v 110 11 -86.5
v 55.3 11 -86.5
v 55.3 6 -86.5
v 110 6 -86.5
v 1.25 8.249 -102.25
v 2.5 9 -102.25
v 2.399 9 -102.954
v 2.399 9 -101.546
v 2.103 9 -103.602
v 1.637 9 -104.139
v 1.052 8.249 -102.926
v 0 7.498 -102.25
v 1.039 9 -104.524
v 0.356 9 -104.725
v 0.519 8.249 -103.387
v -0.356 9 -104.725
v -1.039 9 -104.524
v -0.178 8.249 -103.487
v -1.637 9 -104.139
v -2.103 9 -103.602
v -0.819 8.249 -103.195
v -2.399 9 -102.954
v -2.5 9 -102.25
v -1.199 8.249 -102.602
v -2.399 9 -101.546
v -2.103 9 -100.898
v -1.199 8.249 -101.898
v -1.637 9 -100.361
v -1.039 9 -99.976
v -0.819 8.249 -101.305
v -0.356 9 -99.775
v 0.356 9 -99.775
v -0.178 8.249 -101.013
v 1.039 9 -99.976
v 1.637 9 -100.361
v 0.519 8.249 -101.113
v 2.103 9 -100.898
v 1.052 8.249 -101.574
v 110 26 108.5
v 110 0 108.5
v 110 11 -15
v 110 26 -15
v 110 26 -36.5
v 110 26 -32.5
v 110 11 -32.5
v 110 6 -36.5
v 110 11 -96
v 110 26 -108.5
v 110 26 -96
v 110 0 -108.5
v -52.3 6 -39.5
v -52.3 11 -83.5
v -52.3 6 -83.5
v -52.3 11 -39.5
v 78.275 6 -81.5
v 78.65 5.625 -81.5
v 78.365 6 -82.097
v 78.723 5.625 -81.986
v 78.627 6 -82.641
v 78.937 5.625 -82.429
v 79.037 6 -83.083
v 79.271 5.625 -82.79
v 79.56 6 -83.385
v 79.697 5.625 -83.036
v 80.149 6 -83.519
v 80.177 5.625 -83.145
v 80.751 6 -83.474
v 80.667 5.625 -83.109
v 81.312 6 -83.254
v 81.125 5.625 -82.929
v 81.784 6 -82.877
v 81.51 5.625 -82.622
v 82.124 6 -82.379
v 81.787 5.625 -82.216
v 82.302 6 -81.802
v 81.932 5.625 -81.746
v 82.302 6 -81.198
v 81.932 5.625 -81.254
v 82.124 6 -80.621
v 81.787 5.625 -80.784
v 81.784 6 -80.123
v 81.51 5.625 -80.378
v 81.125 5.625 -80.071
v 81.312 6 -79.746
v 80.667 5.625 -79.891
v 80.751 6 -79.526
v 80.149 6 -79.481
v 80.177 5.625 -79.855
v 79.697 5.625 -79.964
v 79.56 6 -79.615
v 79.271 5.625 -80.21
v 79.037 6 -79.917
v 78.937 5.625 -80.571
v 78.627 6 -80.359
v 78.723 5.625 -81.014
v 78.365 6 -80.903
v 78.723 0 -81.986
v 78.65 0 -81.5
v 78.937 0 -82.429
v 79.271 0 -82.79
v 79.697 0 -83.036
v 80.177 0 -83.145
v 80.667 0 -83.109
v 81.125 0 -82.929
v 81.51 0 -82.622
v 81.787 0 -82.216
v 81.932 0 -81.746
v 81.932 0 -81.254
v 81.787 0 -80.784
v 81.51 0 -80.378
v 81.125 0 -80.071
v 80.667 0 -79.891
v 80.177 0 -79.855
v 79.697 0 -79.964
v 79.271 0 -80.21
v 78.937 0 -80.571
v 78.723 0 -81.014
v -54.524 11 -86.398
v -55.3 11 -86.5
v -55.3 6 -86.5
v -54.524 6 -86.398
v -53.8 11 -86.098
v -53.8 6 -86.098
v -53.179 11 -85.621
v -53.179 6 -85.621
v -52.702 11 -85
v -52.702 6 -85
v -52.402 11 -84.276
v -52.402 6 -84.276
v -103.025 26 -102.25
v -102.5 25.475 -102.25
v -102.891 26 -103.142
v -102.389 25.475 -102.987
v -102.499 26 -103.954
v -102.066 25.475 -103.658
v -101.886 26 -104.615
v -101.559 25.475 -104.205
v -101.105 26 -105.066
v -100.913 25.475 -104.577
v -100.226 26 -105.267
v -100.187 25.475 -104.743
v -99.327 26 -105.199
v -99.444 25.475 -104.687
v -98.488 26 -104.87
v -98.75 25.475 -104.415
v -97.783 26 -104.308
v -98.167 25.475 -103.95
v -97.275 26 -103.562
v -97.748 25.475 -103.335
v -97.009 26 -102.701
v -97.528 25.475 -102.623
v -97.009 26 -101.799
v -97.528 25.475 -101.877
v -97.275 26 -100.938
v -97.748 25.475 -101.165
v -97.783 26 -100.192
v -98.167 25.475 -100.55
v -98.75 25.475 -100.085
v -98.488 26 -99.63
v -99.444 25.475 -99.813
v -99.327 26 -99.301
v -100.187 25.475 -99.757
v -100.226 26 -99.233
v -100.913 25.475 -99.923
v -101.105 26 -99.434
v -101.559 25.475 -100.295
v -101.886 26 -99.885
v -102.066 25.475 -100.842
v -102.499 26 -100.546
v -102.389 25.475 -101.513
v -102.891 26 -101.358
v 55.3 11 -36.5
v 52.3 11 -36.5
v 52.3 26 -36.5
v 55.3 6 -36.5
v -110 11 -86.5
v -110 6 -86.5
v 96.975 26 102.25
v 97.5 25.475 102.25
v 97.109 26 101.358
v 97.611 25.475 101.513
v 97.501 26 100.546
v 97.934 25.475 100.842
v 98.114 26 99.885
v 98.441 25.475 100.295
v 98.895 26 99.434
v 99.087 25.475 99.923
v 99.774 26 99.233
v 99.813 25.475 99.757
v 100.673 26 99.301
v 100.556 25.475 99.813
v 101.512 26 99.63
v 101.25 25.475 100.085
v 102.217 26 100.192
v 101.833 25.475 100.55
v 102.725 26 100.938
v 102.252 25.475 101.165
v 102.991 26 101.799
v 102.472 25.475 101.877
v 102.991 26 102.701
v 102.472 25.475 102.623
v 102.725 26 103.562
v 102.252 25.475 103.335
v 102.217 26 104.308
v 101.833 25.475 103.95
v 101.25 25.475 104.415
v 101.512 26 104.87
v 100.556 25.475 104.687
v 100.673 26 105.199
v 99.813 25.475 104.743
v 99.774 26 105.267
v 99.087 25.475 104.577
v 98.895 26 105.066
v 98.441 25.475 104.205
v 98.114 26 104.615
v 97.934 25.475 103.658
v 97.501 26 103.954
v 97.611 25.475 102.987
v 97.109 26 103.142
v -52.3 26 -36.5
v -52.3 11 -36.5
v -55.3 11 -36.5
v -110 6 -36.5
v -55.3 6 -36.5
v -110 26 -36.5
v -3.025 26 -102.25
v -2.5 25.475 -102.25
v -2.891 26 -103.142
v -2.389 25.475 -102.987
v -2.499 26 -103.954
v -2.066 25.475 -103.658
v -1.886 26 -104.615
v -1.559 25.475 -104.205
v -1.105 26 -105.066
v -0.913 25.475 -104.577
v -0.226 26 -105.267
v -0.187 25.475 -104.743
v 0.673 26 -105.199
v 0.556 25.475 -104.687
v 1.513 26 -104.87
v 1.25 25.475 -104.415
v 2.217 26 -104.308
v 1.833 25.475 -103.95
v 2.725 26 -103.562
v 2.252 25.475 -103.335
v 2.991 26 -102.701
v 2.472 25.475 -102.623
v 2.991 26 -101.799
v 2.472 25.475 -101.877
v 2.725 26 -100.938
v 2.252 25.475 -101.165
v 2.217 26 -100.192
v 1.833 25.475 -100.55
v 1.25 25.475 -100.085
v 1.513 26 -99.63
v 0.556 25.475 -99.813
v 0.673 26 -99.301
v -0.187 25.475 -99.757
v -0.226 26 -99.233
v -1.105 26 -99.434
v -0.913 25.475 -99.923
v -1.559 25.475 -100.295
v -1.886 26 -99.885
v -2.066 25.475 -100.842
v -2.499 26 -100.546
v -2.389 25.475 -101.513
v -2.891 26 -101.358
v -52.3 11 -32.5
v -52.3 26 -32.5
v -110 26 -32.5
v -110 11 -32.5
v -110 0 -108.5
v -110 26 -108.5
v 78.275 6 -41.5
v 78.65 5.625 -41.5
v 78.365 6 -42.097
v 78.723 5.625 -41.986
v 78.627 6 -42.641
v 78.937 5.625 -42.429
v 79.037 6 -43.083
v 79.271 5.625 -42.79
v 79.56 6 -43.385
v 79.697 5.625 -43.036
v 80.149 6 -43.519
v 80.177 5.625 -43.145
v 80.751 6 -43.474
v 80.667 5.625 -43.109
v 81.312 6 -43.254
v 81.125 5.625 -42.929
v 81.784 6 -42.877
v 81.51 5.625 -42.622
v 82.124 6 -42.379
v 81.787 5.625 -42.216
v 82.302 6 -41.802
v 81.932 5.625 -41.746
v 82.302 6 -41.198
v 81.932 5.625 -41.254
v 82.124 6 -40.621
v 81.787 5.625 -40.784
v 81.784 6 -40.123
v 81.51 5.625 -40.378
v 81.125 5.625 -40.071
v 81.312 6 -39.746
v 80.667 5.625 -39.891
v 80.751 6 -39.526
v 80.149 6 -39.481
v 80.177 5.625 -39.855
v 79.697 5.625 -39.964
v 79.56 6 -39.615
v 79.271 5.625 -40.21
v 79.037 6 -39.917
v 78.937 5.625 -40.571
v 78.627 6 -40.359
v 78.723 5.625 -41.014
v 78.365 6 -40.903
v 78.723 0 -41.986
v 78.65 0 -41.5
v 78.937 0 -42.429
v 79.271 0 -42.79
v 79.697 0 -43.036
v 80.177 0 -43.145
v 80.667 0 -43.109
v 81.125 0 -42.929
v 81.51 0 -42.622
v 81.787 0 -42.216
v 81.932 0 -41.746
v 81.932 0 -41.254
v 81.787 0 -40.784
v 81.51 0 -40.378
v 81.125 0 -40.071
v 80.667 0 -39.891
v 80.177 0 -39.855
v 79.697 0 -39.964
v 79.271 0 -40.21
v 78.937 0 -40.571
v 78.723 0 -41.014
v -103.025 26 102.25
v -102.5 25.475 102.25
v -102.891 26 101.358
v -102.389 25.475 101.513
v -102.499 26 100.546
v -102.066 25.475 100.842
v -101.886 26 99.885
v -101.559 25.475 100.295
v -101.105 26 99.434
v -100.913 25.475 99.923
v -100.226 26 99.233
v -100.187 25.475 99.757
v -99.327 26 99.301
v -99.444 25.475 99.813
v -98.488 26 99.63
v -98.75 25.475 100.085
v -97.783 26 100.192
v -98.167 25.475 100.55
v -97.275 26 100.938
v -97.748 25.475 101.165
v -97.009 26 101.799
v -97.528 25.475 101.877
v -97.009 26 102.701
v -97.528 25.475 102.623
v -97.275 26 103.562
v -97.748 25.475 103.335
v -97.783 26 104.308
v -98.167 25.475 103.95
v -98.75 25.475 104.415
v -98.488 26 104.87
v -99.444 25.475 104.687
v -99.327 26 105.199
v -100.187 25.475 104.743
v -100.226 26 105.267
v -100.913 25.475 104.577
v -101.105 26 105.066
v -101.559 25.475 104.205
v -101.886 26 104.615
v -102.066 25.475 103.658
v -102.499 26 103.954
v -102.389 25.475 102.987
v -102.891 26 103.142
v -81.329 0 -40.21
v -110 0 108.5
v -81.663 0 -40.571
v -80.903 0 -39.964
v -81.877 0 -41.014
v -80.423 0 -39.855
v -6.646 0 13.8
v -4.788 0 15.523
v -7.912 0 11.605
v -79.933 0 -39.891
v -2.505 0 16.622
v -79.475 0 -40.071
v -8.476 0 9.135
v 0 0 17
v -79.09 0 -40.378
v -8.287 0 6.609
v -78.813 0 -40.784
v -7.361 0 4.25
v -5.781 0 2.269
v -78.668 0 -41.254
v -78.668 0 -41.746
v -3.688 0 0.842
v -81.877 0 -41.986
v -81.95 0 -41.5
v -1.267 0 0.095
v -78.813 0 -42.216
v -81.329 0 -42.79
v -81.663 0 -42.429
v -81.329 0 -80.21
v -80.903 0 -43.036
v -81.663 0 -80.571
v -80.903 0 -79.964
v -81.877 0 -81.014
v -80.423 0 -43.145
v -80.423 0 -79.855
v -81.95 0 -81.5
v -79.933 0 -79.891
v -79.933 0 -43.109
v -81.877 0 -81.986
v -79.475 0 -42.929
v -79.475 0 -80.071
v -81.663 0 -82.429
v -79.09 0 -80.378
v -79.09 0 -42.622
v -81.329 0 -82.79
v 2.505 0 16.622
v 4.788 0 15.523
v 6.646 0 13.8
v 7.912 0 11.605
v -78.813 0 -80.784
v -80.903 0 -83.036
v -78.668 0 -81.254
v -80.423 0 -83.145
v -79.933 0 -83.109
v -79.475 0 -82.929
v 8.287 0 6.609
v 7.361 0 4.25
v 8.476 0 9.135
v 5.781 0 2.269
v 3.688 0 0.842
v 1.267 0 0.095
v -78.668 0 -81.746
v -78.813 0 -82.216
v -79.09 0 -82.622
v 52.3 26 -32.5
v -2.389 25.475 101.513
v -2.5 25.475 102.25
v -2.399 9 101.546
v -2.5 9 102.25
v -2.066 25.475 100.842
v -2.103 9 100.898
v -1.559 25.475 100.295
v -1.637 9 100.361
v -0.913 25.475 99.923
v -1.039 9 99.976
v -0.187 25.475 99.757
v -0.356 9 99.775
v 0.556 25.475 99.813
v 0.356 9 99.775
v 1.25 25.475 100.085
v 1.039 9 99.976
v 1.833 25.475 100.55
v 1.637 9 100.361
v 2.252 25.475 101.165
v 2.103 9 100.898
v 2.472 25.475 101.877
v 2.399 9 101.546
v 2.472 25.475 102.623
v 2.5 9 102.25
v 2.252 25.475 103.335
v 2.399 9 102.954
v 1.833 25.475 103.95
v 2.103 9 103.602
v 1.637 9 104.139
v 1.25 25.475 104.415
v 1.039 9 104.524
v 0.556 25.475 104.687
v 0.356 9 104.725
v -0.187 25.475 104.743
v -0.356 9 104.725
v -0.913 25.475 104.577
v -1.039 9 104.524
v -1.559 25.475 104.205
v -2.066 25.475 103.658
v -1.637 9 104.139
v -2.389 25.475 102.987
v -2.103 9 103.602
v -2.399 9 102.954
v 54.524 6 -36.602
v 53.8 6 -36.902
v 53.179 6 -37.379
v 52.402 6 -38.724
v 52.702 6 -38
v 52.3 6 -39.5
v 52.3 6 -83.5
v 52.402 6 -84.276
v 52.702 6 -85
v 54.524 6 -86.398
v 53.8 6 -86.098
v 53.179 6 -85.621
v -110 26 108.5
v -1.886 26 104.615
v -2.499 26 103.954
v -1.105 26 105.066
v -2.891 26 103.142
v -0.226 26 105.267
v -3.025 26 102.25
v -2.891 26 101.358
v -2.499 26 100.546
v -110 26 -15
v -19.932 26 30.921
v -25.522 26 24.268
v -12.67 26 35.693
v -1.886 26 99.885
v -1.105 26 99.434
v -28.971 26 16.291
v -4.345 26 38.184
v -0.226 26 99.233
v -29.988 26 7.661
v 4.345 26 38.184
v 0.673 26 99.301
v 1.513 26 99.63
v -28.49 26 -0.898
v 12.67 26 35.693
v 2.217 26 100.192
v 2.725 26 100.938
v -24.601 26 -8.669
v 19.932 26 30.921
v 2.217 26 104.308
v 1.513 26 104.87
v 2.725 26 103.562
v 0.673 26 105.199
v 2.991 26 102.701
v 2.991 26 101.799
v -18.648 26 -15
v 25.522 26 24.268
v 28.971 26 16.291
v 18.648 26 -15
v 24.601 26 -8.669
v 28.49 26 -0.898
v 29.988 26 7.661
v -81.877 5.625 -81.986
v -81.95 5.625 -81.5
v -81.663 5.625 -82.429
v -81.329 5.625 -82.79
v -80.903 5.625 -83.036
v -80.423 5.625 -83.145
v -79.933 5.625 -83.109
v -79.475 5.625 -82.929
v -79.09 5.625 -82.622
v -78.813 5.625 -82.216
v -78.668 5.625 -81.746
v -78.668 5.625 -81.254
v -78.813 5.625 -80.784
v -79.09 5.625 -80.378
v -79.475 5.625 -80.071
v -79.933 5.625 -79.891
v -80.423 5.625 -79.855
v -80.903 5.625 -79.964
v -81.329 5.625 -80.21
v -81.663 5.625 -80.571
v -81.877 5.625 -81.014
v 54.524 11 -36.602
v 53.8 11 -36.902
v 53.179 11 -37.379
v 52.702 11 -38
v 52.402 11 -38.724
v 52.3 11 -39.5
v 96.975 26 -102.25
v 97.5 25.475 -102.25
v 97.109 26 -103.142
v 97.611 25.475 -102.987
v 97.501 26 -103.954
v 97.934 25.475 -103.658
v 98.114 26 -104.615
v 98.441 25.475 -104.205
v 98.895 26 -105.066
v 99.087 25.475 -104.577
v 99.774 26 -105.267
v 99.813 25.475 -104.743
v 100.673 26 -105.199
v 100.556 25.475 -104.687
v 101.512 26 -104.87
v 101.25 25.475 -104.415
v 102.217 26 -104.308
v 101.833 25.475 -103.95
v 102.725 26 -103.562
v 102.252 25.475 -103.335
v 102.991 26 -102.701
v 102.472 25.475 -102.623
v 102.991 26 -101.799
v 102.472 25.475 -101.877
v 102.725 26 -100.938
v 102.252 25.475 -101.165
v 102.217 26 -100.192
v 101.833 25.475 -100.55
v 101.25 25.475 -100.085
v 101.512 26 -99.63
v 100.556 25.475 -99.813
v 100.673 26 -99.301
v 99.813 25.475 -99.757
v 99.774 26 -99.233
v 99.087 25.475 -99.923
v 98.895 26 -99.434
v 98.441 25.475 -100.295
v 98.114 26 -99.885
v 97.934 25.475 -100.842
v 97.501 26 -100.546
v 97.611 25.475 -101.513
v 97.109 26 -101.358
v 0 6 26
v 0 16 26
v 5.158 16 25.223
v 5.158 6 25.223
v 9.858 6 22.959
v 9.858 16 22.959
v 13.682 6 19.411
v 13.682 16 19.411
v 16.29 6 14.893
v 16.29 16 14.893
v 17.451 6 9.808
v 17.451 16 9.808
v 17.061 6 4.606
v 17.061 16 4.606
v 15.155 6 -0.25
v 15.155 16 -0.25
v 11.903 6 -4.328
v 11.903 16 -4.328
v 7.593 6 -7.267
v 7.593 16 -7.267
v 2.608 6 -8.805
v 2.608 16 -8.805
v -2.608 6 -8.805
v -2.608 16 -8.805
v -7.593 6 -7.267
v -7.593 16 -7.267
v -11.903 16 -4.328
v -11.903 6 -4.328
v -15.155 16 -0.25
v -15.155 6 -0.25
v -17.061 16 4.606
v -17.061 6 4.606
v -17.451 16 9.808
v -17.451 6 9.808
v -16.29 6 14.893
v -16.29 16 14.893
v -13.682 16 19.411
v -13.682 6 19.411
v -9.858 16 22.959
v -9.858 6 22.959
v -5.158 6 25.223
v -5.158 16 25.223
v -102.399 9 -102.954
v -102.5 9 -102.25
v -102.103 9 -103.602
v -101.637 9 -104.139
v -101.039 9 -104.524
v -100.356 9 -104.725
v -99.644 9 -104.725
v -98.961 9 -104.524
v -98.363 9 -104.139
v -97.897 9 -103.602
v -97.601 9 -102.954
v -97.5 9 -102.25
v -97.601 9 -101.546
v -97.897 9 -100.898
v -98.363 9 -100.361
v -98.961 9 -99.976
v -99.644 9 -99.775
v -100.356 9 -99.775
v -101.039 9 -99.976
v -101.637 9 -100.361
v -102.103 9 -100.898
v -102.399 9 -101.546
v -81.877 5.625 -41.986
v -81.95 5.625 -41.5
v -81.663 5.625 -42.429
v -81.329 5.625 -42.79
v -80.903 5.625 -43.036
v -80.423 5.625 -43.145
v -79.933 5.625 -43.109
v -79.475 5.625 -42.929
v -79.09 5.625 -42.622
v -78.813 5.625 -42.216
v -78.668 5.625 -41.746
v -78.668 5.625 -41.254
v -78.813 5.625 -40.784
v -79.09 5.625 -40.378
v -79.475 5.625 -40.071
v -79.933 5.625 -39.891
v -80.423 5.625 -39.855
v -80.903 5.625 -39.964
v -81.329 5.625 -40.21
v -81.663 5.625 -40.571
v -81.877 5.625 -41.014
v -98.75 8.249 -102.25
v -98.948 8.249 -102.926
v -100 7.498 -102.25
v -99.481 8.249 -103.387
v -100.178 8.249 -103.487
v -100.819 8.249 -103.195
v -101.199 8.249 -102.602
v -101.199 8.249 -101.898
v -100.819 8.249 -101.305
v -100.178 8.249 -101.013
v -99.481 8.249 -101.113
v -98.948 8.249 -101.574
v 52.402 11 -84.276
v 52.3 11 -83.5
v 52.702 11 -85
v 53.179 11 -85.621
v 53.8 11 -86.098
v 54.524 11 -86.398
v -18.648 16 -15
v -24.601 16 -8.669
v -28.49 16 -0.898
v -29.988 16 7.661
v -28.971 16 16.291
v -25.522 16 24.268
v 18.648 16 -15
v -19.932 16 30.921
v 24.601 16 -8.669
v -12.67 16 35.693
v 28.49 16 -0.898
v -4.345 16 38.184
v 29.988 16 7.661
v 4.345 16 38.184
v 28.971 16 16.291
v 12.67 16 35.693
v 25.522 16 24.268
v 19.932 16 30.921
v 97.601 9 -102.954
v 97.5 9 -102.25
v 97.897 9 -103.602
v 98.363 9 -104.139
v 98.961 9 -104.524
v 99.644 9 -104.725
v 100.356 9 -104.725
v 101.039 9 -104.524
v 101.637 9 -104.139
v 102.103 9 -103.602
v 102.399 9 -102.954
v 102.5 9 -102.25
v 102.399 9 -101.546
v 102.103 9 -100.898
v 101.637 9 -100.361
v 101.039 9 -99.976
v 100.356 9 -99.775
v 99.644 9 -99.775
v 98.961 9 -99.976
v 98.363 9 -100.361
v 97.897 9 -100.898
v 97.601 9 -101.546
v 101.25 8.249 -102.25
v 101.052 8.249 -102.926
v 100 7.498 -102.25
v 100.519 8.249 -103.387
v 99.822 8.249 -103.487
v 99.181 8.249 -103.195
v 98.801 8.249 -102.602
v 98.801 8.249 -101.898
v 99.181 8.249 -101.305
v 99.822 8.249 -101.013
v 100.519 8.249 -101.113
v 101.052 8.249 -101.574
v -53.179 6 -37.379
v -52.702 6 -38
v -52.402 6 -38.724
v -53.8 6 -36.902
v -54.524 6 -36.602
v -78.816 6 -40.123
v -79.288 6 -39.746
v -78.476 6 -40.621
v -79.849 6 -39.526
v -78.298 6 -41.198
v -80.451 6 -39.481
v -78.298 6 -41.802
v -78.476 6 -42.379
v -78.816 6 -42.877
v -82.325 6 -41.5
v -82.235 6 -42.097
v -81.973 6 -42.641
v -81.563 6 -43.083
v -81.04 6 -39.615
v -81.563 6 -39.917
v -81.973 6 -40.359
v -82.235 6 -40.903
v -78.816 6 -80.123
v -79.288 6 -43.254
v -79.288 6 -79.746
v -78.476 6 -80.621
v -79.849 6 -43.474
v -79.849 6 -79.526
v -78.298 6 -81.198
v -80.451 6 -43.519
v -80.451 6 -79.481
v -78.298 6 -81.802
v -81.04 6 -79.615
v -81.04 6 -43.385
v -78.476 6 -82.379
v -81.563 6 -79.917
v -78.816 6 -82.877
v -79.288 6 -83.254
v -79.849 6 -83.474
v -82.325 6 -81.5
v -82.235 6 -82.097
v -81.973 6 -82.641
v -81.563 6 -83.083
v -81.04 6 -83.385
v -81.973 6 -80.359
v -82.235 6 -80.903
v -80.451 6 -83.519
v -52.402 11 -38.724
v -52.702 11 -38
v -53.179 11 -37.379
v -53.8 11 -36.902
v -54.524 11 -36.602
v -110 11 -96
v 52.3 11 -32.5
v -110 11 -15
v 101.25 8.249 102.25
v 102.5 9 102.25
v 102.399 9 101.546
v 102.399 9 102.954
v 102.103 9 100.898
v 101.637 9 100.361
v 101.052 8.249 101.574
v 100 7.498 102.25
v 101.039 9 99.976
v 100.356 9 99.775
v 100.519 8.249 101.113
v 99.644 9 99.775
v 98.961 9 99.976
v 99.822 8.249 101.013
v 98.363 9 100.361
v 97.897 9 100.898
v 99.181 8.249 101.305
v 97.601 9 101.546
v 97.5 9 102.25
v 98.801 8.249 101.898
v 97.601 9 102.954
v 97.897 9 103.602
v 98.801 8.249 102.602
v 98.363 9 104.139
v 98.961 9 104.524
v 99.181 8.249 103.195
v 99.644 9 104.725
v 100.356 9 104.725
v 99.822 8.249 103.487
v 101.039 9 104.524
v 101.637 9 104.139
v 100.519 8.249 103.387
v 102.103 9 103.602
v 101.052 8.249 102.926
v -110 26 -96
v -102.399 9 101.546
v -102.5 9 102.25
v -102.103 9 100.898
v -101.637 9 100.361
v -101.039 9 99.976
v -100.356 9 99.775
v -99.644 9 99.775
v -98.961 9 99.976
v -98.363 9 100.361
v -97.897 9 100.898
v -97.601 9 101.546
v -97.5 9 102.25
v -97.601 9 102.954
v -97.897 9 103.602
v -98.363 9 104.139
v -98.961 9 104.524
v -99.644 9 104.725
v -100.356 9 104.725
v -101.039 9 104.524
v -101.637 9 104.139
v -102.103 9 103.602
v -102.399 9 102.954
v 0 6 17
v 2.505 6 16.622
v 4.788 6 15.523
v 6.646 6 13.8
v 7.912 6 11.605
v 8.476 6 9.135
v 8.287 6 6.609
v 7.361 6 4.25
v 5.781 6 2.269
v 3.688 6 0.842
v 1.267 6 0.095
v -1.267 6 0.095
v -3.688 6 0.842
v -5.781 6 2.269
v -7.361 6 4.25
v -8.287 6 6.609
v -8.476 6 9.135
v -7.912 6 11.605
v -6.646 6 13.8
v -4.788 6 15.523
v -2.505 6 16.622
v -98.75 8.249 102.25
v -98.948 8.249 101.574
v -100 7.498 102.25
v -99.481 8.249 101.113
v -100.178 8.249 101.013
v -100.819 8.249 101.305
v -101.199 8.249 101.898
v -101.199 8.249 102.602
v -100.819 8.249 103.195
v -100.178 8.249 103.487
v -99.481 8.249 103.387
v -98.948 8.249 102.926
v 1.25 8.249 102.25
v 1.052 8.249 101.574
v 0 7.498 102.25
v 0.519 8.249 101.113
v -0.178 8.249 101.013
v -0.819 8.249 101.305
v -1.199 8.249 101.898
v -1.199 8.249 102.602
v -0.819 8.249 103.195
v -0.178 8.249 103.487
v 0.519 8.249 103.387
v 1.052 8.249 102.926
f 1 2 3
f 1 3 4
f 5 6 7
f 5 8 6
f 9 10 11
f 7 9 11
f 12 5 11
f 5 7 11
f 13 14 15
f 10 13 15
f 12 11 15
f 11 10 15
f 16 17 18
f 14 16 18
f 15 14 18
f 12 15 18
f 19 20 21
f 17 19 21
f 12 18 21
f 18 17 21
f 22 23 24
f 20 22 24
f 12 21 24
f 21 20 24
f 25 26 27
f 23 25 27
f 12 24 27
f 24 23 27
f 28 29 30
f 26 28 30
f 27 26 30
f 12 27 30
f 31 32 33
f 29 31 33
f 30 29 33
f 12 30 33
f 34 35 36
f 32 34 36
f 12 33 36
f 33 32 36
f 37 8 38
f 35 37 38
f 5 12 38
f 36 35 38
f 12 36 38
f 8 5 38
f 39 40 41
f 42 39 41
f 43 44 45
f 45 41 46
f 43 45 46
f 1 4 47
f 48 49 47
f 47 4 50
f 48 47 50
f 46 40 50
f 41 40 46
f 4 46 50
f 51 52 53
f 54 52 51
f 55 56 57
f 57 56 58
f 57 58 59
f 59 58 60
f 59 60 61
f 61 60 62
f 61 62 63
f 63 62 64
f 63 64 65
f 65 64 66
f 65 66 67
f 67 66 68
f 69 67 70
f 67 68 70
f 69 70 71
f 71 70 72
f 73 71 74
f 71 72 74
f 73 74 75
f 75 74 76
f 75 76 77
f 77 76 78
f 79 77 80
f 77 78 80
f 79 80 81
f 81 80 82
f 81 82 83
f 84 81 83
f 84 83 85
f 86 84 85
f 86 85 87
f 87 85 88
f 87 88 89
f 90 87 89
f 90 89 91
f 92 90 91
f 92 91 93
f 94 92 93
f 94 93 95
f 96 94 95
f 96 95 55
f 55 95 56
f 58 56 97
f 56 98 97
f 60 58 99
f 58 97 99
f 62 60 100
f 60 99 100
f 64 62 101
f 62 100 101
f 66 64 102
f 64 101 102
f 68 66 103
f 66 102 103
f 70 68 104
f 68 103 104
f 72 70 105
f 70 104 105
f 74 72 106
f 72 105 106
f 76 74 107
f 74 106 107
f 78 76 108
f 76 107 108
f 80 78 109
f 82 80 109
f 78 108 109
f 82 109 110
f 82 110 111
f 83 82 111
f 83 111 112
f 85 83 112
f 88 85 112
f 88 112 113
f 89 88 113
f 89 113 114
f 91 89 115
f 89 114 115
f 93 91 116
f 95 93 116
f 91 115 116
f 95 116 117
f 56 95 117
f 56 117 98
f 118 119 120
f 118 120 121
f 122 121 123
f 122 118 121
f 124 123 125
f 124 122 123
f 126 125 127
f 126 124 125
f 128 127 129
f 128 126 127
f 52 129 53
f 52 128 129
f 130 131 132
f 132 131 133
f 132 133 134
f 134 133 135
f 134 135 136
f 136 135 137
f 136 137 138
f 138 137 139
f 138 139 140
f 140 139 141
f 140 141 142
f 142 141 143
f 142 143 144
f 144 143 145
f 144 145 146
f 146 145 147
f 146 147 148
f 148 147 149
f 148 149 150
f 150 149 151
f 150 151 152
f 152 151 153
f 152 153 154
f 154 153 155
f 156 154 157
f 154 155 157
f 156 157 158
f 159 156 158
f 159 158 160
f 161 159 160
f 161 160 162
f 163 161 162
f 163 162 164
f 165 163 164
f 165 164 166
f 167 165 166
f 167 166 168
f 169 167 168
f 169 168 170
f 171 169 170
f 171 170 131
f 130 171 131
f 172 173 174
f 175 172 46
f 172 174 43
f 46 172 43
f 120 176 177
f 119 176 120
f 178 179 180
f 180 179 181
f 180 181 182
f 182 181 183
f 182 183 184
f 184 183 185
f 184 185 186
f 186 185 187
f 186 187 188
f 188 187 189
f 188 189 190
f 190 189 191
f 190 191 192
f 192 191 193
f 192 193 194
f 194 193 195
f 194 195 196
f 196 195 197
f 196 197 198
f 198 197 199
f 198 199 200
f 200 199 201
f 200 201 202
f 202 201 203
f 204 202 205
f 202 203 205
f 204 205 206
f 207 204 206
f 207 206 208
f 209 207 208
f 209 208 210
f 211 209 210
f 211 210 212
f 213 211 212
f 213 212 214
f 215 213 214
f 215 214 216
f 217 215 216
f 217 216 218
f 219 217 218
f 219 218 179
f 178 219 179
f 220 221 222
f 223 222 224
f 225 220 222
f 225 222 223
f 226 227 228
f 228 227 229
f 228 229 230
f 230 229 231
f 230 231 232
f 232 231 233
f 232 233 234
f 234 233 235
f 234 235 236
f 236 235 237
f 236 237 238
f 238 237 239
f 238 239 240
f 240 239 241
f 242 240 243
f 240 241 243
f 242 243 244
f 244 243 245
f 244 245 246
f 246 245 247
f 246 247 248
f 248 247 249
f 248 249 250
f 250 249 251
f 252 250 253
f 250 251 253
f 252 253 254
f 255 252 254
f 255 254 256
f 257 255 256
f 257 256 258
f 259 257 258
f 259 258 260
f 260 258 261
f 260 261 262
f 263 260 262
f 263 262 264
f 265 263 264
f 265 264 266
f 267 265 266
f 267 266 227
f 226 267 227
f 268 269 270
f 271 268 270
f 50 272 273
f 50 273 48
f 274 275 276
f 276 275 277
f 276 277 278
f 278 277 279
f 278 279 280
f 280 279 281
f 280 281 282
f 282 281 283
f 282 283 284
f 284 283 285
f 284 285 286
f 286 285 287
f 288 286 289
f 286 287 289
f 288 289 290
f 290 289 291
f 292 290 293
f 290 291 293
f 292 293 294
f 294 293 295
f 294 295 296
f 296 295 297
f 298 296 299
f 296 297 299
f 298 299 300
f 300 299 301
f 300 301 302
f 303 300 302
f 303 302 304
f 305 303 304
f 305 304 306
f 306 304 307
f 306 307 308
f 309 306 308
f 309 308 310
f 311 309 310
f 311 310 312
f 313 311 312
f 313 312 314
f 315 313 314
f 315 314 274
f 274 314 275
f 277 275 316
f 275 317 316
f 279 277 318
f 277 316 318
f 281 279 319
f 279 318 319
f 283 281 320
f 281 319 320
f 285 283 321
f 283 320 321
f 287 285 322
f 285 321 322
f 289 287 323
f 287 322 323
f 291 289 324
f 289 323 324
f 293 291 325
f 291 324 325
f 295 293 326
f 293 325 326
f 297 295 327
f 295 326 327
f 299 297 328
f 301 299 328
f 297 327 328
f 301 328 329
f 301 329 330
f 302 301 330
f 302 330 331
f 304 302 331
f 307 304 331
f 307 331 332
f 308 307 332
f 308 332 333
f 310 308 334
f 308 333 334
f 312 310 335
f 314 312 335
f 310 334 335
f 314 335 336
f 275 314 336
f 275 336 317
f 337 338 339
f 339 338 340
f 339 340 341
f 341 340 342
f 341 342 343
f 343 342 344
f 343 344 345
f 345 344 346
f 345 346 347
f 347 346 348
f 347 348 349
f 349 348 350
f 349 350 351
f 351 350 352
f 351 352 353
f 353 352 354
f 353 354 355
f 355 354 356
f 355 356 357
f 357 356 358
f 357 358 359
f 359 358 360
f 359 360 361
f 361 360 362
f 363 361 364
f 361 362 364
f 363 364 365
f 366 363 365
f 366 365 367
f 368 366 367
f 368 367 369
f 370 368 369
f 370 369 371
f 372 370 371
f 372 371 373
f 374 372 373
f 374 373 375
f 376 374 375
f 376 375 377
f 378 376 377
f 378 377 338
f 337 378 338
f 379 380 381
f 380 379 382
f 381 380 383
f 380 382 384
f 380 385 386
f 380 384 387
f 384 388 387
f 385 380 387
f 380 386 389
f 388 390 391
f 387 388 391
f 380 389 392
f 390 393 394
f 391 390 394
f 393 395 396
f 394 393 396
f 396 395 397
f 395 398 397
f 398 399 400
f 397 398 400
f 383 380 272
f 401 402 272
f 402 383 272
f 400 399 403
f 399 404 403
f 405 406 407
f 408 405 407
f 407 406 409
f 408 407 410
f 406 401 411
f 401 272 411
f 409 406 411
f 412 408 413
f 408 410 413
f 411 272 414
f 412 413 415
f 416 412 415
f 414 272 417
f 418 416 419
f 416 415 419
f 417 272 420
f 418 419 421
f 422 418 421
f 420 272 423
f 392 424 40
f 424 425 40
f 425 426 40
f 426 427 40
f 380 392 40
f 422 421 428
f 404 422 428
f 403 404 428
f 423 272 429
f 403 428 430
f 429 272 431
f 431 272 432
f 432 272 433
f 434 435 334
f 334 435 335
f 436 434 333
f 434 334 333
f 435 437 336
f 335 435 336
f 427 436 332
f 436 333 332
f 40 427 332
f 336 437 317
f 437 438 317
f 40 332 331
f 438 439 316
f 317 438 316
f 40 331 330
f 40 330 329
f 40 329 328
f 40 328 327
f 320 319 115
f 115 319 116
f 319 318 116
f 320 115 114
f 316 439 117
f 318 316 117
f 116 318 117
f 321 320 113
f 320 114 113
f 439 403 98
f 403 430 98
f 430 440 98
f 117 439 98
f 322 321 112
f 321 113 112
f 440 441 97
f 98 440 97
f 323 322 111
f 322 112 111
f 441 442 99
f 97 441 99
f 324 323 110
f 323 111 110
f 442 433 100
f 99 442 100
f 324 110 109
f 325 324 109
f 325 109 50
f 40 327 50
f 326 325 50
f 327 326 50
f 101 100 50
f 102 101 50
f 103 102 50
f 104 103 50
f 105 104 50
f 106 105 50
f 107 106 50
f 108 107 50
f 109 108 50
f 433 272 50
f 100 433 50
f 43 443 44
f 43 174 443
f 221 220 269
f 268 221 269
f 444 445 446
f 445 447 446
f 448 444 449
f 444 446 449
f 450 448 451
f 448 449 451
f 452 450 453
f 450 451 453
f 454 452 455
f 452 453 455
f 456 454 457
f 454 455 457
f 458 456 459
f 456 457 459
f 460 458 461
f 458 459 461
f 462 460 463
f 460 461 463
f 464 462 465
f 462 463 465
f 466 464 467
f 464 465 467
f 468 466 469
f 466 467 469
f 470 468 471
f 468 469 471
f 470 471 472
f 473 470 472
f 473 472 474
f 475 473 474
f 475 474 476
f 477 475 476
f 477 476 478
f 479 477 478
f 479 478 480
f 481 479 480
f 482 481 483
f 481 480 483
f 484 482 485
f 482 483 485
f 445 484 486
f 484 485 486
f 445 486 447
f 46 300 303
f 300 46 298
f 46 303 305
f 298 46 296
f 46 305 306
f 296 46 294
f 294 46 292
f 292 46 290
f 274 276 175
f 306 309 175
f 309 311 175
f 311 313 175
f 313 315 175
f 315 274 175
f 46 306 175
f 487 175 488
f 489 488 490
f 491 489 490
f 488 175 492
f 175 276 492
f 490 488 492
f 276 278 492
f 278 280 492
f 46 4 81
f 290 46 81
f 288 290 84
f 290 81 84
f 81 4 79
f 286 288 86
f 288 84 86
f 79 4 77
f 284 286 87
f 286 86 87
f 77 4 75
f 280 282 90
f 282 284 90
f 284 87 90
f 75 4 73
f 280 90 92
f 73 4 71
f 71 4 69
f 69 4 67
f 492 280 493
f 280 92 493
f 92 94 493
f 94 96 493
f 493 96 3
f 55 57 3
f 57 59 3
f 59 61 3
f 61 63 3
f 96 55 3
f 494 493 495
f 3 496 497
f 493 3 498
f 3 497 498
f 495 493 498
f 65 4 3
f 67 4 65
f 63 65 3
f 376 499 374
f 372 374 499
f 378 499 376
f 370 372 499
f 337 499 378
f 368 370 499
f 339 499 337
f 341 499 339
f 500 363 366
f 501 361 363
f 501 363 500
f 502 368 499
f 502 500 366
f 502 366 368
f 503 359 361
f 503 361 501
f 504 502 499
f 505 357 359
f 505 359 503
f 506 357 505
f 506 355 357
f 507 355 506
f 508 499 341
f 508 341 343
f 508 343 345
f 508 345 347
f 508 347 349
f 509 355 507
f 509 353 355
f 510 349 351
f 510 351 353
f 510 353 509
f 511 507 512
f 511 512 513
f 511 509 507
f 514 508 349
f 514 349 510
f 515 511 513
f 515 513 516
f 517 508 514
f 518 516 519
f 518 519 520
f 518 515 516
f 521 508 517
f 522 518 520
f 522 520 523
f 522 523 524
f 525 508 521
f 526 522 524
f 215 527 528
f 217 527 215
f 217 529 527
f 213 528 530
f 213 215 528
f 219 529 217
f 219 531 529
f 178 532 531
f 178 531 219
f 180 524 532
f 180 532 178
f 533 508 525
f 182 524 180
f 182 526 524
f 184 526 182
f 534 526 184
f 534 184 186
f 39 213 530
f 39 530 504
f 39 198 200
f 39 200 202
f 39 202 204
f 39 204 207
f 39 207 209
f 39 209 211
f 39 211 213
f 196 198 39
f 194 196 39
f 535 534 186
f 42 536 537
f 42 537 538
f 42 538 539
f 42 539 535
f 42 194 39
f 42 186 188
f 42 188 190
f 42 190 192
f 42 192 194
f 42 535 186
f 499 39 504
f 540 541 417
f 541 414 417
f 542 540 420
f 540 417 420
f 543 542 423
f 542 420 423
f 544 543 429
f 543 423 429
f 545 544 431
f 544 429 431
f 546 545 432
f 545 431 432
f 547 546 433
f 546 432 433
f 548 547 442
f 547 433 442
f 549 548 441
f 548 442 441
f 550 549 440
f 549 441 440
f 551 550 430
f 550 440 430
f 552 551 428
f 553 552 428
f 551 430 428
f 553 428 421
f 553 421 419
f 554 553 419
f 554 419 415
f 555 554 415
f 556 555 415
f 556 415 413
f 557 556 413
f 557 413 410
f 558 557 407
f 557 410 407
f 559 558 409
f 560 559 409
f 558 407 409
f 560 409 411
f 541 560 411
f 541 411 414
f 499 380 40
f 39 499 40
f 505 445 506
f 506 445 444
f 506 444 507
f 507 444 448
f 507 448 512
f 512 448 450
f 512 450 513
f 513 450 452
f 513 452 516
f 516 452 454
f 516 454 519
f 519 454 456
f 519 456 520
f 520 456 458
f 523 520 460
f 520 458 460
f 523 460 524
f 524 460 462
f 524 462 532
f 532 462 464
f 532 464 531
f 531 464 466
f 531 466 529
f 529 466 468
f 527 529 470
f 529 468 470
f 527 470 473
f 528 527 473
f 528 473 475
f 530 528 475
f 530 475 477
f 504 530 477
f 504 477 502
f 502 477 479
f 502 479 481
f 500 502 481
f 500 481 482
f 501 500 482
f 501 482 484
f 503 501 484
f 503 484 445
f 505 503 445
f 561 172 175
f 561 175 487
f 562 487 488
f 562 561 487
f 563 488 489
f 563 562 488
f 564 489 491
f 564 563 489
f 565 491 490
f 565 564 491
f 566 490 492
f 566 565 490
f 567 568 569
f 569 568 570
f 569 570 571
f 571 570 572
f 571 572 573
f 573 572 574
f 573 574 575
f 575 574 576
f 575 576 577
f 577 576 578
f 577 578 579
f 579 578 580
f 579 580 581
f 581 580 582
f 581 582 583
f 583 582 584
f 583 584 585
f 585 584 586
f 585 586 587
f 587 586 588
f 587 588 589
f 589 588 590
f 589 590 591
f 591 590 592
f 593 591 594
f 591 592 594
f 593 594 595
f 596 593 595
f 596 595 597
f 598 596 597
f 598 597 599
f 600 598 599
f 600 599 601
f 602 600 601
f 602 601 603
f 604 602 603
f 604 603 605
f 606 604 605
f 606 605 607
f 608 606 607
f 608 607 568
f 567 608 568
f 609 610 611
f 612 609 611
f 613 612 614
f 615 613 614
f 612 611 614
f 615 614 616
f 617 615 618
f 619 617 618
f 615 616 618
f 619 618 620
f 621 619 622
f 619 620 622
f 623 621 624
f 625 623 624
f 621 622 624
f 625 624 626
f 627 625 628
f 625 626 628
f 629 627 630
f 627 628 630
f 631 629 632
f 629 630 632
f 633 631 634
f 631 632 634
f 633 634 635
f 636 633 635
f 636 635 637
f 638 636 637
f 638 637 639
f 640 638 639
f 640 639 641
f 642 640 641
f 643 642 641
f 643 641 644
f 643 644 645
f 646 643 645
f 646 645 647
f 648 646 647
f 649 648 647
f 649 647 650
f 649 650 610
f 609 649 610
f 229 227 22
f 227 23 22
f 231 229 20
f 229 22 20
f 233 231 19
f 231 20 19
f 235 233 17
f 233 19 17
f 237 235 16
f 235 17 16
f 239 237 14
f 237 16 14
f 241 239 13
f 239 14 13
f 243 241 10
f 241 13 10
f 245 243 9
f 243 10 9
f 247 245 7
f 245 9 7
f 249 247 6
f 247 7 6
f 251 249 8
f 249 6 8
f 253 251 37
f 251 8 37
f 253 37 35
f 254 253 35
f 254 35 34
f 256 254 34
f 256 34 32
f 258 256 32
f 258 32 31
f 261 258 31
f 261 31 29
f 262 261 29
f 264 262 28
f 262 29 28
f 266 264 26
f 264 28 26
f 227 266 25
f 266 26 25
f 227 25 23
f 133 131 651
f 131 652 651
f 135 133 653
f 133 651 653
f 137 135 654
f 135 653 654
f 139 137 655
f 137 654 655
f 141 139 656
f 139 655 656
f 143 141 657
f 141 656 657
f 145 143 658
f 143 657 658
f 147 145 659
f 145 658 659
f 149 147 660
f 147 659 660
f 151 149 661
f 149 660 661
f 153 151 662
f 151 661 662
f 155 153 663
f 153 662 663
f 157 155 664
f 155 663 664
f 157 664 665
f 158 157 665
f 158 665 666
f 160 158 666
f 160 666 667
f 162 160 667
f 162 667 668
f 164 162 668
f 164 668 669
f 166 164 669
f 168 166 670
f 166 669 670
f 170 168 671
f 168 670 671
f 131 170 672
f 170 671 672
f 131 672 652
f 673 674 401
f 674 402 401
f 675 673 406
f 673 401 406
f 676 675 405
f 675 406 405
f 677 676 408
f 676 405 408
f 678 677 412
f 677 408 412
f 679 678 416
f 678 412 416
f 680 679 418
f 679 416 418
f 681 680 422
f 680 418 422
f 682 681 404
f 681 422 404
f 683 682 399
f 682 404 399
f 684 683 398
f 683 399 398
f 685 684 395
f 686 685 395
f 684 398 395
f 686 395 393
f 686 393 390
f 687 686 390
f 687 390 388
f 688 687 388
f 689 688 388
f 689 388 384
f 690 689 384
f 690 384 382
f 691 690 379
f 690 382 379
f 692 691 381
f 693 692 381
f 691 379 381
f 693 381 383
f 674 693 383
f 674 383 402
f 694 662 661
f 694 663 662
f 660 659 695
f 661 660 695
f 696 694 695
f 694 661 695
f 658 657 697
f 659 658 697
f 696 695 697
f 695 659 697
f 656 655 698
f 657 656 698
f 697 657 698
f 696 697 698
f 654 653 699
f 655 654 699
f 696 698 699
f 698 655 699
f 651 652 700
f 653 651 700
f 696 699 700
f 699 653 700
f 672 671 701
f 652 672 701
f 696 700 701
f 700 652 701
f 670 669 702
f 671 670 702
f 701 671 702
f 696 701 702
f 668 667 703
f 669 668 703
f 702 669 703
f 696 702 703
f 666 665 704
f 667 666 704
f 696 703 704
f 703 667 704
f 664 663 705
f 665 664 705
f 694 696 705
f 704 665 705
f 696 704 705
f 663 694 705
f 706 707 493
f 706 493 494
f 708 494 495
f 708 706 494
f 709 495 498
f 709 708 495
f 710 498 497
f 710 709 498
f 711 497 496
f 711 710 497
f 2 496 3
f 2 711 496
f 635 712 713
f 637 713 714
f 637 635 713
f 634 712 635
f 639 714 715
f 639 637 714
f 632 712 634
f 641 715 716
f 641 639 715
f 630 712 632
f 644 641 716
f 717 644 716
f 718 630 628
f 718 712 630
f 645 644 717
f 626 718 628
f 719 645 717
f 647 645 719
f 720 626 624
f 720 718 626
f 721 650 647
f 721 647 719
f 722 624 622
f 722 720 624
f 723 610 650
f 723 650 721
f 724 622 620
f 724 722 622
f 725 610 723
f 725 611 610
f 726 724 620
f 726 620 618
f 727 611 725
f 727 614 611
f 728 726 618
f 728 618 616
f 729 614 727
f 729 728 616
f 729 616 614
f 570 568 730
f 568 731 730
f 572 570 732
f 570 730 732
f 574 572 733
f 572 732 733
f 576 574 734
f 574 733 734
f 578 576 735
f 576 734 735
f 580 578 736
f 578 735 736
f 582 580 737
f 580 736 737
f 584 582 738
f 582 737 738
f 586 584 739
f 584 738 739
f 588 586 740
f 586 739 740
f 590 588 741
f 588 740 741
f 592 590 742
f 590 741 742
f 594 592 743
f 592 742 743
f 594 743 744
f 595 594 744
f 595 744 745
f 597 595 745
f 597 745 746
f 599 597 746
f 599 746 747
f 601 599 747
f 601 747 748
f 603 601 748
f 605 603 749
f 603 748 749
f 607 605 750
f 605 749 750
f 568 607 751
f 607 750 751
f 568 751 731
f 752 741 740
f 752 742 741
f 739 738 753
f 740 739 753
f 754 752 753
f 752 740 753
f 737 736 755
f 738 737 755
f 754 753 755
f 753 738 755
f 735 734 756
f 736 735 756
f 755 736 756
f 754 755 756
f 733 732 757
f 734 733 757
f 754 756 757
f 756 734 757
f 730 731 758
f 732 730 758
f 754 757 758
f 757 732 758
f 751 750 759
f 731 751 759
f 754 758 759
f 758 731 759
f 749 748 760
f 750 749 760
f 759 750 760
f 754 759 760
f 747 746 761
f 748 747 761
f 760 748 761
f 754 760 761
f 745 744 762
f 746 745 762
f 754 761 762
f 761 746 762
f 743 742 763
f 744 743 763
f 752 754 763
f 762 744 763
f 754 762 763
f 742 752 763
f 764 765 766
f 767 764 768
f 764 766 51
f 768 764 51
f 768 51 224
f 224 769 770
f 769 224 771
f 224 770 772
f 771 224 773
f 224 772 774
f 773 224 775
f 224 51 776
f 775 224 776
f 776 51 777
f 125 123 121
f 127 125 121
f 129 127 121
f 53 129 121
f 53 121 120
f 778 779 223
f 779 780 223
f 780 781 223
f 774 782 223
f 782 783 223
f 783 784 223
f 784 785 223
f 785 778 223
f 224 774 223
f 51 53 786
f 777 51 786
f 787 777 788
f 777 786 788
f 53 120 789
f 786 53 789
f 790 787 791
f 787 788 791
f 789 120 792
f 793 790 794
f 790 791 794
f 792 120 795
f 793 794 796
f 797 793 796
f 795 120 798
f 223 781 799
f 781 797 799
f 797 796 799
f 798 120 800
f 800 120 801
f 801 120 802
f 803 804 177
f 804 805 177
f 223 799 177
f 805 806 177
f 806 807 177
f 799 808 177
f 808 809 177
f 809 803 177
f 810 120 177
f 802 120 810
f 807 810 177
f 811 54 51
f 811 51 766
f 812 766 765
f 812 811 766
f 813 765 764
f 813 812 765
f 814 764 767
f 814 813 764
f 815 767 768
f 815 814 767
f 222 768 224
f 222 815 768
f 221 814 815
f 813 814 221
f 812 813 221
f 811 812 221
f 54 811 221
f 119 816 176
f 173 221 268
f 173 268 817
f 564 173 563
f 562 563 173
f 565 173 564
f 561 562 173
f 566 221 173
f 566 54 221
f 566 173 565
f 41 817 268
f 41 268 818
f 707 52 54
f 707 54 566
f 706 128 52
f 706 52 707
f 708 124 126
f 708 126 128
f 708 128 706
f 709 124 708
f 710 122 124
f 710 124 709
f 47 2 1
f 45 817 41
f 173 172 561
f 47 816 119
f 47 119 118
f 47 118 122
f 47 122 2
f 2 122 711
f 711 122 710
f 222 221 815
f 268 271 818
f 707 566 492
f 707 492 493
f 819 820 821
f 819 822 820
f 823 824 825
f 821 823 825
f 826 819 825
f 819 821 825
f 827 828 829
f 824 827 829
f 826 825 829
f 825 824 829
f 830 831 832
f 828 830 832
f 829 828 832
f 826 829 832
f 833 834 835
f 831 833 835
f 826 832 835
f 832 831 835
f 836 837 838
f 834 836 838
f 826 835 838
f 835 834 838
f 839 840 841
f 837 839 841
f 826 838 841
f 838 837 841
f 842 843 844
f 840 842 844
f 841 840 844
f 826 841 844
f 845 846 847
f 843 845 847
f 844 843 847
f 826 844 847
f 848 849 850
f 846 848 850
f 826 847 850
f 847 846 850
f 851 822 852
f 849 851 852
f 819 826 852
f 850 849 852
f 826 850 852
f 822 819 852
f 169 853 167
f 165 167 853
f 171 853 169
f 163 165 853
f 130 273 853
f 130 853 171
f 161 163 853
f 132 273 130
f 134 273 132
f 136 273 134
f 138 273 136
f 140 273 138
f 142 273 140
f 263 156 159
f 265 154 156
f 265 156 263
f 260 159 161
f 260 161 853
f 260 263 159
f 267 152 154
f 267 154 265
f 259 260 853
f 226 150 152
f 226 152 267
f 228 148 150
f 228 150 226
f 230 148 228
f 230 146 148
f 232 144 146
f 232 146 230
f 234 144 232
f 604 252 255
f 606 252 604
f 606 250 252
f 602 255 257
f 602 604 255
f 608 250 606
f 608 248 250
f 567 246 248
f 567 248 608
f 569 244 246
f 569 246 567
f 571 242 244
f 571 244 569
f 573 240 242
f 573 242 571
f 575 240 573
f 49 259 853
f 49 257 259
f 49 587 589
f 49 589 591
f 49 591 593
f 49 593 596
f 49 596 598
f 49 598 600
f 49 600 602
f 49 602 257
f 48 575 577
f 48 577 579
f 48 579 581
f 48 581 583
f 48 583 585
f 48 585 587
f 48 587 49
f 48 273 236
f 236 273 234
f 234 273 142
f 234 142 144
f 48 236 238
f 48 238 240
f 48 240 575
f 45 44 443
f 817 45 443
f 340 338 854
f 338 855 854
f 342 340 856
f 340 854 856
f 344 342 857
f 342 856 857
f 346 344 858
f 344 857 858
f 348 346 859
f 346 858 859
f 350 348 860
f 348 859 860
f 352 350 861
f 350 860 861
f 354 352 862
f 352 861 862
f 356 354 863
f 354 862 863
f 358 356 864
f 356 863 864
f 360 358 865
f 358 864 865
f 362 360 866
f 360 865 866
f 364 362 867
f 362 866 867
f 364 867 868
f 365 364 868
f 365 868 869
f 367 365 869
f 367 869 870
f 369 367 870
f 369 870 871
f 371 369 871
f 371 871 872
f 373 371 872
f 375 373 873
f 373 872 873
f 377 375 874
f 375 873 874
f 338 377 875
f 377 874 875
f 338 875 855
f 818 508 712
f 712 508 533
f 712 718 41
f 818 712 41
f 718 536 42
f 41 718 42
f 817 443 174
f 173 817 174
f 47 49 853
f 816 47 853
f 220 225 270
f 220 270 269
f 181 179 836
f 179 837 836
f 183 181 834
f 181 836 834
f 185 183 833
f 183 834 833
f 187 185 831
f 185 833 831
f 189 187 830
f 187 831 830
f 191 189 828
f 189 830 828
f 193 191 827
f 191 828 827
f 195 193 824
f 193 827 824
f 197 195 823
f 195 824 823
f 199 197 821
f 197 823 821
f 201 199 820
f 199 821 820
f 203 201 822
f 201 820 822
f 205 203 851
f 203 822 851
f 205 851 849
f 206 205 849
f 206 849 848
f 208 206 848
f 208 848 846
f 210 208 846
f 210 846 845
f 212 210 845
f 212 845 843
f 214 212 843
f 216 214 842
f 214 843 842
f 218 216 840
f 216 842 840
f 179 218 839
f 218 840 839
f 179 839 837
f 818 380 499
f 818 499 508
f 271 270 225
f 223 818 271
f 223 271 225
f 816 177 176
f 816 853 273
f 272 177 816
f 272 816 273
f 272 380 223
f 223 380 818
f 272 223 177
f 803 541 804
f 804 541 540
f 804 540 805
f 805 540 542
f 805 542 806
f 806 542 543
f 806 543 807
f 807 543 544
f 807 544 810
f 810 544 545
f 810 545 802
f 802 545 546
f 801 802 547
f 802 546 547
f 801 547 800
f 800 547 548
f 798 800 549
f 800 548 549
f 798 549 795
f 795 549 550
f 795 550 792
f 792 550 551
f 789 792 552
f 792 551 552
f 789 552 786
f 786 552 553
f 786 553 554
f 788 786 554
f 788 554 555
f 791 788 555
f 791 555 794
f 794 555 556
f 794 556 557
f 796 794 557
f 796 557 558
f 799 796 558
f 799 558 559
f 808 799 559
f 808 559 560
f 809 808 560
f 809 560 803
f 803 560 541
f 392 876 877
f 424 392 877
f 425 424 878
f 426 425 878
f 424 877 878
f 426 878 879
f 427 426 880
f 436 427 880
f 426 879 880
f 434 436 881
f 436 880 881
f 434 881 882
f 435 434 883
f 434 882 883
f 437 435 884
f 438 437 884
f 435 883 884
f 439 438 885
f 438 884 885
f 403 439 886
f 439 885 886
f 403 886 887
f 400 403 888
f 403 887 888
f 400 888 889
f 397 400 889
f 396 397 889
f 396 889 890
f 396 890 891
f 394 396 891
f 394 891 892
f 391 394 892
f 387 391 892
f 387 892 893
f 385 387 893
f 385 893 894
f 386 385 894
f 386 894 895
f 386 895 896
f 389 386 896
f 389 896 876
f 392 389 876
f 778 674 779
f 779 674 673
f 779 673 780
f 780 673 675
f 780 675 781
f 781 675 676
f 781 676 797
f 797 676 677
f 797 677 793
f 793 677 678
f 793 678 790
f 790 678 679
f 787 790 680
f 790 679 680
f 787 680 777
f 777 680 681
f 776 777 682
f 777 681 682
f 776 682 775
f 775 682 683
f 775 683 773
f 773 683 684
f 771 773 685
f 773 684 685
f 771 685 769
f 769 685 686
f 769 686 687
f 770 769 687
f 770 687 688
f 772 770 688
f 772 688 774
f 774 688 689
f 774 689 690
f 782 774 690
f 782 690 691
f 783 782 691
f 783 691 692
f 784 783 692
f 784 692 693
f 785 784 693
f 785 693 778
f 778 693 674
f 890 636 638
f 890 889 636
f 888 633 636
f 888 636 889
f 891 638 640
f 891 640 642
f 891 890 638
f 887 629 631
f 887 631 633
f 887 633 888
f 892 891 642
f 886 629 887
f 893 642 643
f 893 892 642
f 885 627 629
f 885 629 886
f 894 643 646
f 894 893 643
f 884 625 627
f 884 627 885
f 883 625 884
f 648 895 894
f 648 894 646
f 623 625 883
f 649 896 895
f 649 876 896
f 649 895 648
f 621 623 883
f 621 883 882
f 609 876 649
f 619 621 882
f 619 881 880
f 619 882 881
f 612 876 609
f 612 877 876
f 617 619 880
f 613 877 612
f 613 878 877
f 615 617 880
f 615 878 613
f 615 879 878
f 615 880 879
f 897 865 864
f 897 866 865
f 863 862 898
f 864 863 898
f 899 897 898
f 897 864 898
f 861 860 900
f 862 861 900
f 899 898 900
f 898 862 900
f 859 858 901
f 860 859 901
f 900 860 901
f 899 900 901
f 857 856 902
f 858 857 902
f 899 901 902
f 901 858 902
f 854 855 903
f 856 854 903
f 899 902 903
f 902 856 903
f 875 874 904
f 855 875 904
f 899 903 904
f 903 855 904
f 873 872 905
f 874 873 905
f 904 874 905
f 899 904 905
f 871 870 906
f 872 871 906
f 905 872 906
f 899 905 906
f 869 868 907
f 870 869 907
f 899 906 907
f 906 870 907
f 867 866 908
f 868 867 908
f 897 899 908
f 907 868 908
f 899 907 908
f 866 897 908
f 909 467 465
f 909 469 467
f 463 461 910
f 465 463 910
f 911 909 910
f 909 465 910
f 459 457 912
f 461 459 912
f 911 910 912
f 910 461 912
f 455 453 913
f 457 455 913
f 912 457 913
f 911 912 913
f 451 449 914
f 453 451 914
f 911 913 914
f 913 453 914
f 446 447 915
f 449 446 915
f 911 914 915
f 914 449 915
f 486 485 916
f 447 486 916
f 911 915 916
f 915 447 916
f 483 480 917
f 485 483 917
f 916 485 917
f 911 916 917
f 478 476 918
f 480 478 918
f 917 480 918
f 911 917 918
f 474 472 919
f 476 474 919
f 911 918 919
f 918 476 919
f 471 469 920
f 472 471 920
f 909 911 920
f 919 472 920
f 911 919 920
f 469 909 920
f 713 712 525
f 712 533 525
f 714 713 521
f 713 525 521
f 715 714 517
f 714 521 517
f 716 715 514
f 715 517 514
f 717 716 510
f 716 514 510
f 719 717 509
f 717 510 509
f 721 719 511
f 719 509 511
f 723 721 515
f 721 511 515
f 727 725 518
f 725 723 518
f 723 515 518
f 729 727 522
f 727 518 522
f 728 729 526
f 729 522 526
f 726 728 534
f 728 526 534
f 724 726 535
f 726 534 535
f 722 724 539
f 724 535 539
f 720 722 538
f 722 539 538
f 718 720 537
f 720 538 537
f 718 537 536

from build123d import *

# Parameters (mm, degrees)
SKETCH1_W                       = 220
SKETCH1_H                       = 217
BLOCO_BRUTO_DEPTH               = 26
SKETCH2_R                       = 8.5
FURO_17_PASSANTE_DEPTH          = 157.678811586
SKETCH2_3_R                     = 17.5
SKETCH2_3_R_2                   = 8.5
REBAIXO_35X20_DEPTH             = 20
SKETCH2_4_R                     = 30
SKETCH2_4_R_2                   = 17.5
REBAIXO_60X10_DEPTH             = 10
REBAIXO_220X81X15_DEPTH         = 15
REBAIXO_ENCAIXE_MANCAIS_DEPTH   = 5
M6X1_0_FUROS_APOIO_D            = 5
M6X1_0_FUROS_APOIO_DEPTH        = 17
M6X1_0_FUROS_APOIO_CSINK_D      = 6.05
M6X1_0_FUROS_APOIO_CSINK_ANGLE  = 90
M6X1_0_FUROS_APOIO_TIP          = 1.502151548
M4X0_7_TAPPED_HOLE1_D           = 3.3
M4X0_7_TAPPED_HOLE1_DEPTH       = 11.5
M4X0_7_TAPPED_HOLE1_CSINK_D     = 4.05
M4X0_7_TAPPED_HOLE1_CSINK_ANGLE = 90
M4X0_7_TAPPED_HOLE1_TIP         = 0.991420021


with BuildPart() as part:
    # Sketch1 → Bloco (Bruto) (new body)
    with BuildSketch(Plane(origin=(0, 0, 0), x_dir=(1, 0, 0), z_dir=(0, 1, 0))):
        Rectangle(SKETCH1_W, SKETCH1_H)
    extrude(amount=BLOCO_BRUTO_DEPTH)

    # Sketch2 → Furo Ø17 Passante (cut, through all)
    with BuildSketch(Plane(origin=(0, 26, 0), x_dir=(1, 0, 0), z_dir=(0, 1, 0))):
        with Locations(Location((0, -8.5, 0), (0, 0, 270))):
            Circle(SKETCH2_R)
    extrude(amount=-FURO_17_PASSANTE_DEPTH, mode=Mode.SUBTRACT)

    # Sketch2<3> → Rebaixo Ø35x20 (cut)
    with BuildSketch(Plane(origin=(0, 26, 0), x_dir=(1, 0, 0), z_dir=(0, 1, 0))):
        with Locations(Location((0, -8.5, 0), (0, 0, 270))):
            Circle(SKETCH2_3_R)
        with Locations(Location((0, -8.5, 0), (0, 0, 270))):
            Circle(SKETCH2_3_R_2, mode=Mode.SUBTRACT)
    extrude(amount=-REBAIXO_35X20_DEPTH, mode=Mode.SUBTRACT)

    # Sketch2<4> → Rebaixo Ø60x10 (cut)
    with BuildSketch(Plane(origin=(0, 26, 0), x_dir=(1, 0, 0), z_dir=(0, 1, 0))):
        with Locations(Location((0, -8.5, 0), (0, 0, 270))):
            Circle(SKETCH2_4_R)
        with Locations(Location((0, -8.5, 0), (0, 0, 270))):
            Circle(SKETCH2_4_R_2, mode=Mode.SUBTRACT)
    extrude(amount=-REBAIXO_60X10_DEPTH, mode=Mode.SUBTRACT)

    # Sketch3 → Rebaixo 220x81x15 (cut)
    with BuildSketch(Plane(origin=(0, 26, 0), x_dir=(1, 0, 0), z_dir=(0, 1, 0))):
        with BuildLine():
            ThreePointArc((18.648056199, 15), (9.874208829, 19.828430948), (0, 21.5))
            Line((0, 21.5), (0, 15))
            Line((0, 15), (18.648056199, 15))
        make_face()
        with BuildLine():
            Line((0, 15), (0, 21.5))
            ThreePointArc((0, 21.5), (-9.874208829, 19.828430948), (-18.648056199, 15))
            Line((-18.648056199, 15), (0, 15))
        make_face()
        with BuildLine():
            Line((110, 36.5), (110, 96))
            Line((110, 96), (0, 96))
            Line((0, 96), (0, 21.5))
            ThreePointArc((0, 21.5), (9.874208829, 19.828430948), (18.648056199, 15))
            Line((18.648056199, 15), (110, 15))
            Line((110, 15), (110, 32.5))
            Line((110, 32.5), (52.3, 32.5))
            Line((52.3, 32.5), (52.3, 36.5))
            Line((52.3, 36.5), (110, 36.5))
        make_face()
        with BuildLine():
            Line((0, 21.5), (0, 96))
            Line((0, 96), (-110, 96))
            Line((-110, 96), (-110, 36.5))
            Line((-110, 36.5), (-52.3, 36.5))
            Line((-52.3, 36.5), (-52.3, 32.5))
            Line((-52.3, 32.5), (-110, 32.5))
            Line((-110, 32.5), (-110, 15))
            Line((-110, 15), (-18.648056199, 15))
            ThreePointArc((-18.648056199, 15), (-9.874208829, 19.828430948), (0, 21.5))
        make_face()
    extrude(amount=-REBAIXO_220X81X15_DEPTH, mode=Mode.SUBTRACT)

    # Sketch4 → Rebaixo - Encaixe Mancais (cut)
    with BuildSketch(Plane(origin=(0, 11, 0), x_dir=(1, 0, 0), z_dir=(0, 1, 0))):
        with BuildLine():
            Line((-110, 86.5), (-55.3, 86.5))
            ThreePointArc((-55.3, 86.5), (-53.178679656, 85.621320344), (-52.3, 83.5))
            Line((-52.3, 83.5), (-52.3, 39.5))
            ThreePointArc((-52.3, 39.5), (-53.178679656, 37.378679656), (-55.3, 36.5))
            Line((-55.3, 36.5), (-110, 36.5))
            Line((-110, 36.5), (-110, 86.5))
        make_face()
        with BuildLine():
            Line((110, 36.5), (55.3, 36.5))
            ThreePointArc((55.3, 36.5), (53.178679656, 37.378679656), (52.3, 39.5))
            Line((52.3, 39.5), (52.3, 83.5))
            ThreePointArc((52.3, 83.5), (53.178679656, 85.621320344), (55.3, 86.5))
            Line((55.3, 86.5), (110, 86.5))
            Line((110, 86.5), (110, 36.5))
        make_face()
    extrude(amount=-REBAIXO_ENCAIXE_MANCAIS_DEPTH, mode=Mode.SUBTRACT)

    # M6x1.0 - Furos Apoio
    with Locations(Plane(origin=(0, 26, 0), x_dir=(1, 0, 0), z_dir=(0, 1, 0))):
        with Locations((-100, -102.25), (0, -102.25), (100, -102.25), (-100, 102.25), (0, 102.25), (100, 102.25)):
            CounterSinkHole(M6X1_0_FUROS_APOIO_D / 2, M6X1_0_FUROS_APOIO_CSINK_D / 2, depth=M6X1_0_FUROS_APOIO_DEPTH, counter_sink_angle=M6X1_0_FUROS_APOIO_CSINK_ANGLE)
            with Locations((0, 0, -(M6X1_0_FUROS_APOIO_DEPTH + M6X1_0_FUROS_APOIO_TIP / 2))):  # 118° drill point
                Cone(0, M6X1_0_FUROS_APOIO_D / 2, M6X1_0_FUROS_APOIO_TIP, mode=Mode.SUBTRACT)

    # M4x0.7 Tapped Hole1
    with Locations(Plane(origin=(0, 6, 0), x_dir=(1, 0, 0), z_dir=(0, 1, 0))):
        with Locations((-80.3, 81.5), (-80.3, 41.5), (80.3, 81.5), (80.3, 41.5)):
            CounterSinkHole(M4X0_7_TAPPED_HOLE1_D / 2, M4X0_7_TAPPED_HOLE1_CSINK_D / 2, depth=M4X0_7_TAPPED_HOLE1_DEPTH, counter_sink_angle=M4X0_7_TAPPED_HOLE1_CSINK_ANGLE)
            with Locations((0, 0, -(M4X0_7_TAPPED_HOLE1_DEPTH + M4X0_7_TAPPED_HOLE1_TIP / 2))):  # 118° drill point
                Cone(0, M4X0_7_TAPPED_HOLE1_D / 2, M4X0_7_TAPPED_HOLE1_TIP, mode=Mode.SUBTRACT)


solid = part.part
